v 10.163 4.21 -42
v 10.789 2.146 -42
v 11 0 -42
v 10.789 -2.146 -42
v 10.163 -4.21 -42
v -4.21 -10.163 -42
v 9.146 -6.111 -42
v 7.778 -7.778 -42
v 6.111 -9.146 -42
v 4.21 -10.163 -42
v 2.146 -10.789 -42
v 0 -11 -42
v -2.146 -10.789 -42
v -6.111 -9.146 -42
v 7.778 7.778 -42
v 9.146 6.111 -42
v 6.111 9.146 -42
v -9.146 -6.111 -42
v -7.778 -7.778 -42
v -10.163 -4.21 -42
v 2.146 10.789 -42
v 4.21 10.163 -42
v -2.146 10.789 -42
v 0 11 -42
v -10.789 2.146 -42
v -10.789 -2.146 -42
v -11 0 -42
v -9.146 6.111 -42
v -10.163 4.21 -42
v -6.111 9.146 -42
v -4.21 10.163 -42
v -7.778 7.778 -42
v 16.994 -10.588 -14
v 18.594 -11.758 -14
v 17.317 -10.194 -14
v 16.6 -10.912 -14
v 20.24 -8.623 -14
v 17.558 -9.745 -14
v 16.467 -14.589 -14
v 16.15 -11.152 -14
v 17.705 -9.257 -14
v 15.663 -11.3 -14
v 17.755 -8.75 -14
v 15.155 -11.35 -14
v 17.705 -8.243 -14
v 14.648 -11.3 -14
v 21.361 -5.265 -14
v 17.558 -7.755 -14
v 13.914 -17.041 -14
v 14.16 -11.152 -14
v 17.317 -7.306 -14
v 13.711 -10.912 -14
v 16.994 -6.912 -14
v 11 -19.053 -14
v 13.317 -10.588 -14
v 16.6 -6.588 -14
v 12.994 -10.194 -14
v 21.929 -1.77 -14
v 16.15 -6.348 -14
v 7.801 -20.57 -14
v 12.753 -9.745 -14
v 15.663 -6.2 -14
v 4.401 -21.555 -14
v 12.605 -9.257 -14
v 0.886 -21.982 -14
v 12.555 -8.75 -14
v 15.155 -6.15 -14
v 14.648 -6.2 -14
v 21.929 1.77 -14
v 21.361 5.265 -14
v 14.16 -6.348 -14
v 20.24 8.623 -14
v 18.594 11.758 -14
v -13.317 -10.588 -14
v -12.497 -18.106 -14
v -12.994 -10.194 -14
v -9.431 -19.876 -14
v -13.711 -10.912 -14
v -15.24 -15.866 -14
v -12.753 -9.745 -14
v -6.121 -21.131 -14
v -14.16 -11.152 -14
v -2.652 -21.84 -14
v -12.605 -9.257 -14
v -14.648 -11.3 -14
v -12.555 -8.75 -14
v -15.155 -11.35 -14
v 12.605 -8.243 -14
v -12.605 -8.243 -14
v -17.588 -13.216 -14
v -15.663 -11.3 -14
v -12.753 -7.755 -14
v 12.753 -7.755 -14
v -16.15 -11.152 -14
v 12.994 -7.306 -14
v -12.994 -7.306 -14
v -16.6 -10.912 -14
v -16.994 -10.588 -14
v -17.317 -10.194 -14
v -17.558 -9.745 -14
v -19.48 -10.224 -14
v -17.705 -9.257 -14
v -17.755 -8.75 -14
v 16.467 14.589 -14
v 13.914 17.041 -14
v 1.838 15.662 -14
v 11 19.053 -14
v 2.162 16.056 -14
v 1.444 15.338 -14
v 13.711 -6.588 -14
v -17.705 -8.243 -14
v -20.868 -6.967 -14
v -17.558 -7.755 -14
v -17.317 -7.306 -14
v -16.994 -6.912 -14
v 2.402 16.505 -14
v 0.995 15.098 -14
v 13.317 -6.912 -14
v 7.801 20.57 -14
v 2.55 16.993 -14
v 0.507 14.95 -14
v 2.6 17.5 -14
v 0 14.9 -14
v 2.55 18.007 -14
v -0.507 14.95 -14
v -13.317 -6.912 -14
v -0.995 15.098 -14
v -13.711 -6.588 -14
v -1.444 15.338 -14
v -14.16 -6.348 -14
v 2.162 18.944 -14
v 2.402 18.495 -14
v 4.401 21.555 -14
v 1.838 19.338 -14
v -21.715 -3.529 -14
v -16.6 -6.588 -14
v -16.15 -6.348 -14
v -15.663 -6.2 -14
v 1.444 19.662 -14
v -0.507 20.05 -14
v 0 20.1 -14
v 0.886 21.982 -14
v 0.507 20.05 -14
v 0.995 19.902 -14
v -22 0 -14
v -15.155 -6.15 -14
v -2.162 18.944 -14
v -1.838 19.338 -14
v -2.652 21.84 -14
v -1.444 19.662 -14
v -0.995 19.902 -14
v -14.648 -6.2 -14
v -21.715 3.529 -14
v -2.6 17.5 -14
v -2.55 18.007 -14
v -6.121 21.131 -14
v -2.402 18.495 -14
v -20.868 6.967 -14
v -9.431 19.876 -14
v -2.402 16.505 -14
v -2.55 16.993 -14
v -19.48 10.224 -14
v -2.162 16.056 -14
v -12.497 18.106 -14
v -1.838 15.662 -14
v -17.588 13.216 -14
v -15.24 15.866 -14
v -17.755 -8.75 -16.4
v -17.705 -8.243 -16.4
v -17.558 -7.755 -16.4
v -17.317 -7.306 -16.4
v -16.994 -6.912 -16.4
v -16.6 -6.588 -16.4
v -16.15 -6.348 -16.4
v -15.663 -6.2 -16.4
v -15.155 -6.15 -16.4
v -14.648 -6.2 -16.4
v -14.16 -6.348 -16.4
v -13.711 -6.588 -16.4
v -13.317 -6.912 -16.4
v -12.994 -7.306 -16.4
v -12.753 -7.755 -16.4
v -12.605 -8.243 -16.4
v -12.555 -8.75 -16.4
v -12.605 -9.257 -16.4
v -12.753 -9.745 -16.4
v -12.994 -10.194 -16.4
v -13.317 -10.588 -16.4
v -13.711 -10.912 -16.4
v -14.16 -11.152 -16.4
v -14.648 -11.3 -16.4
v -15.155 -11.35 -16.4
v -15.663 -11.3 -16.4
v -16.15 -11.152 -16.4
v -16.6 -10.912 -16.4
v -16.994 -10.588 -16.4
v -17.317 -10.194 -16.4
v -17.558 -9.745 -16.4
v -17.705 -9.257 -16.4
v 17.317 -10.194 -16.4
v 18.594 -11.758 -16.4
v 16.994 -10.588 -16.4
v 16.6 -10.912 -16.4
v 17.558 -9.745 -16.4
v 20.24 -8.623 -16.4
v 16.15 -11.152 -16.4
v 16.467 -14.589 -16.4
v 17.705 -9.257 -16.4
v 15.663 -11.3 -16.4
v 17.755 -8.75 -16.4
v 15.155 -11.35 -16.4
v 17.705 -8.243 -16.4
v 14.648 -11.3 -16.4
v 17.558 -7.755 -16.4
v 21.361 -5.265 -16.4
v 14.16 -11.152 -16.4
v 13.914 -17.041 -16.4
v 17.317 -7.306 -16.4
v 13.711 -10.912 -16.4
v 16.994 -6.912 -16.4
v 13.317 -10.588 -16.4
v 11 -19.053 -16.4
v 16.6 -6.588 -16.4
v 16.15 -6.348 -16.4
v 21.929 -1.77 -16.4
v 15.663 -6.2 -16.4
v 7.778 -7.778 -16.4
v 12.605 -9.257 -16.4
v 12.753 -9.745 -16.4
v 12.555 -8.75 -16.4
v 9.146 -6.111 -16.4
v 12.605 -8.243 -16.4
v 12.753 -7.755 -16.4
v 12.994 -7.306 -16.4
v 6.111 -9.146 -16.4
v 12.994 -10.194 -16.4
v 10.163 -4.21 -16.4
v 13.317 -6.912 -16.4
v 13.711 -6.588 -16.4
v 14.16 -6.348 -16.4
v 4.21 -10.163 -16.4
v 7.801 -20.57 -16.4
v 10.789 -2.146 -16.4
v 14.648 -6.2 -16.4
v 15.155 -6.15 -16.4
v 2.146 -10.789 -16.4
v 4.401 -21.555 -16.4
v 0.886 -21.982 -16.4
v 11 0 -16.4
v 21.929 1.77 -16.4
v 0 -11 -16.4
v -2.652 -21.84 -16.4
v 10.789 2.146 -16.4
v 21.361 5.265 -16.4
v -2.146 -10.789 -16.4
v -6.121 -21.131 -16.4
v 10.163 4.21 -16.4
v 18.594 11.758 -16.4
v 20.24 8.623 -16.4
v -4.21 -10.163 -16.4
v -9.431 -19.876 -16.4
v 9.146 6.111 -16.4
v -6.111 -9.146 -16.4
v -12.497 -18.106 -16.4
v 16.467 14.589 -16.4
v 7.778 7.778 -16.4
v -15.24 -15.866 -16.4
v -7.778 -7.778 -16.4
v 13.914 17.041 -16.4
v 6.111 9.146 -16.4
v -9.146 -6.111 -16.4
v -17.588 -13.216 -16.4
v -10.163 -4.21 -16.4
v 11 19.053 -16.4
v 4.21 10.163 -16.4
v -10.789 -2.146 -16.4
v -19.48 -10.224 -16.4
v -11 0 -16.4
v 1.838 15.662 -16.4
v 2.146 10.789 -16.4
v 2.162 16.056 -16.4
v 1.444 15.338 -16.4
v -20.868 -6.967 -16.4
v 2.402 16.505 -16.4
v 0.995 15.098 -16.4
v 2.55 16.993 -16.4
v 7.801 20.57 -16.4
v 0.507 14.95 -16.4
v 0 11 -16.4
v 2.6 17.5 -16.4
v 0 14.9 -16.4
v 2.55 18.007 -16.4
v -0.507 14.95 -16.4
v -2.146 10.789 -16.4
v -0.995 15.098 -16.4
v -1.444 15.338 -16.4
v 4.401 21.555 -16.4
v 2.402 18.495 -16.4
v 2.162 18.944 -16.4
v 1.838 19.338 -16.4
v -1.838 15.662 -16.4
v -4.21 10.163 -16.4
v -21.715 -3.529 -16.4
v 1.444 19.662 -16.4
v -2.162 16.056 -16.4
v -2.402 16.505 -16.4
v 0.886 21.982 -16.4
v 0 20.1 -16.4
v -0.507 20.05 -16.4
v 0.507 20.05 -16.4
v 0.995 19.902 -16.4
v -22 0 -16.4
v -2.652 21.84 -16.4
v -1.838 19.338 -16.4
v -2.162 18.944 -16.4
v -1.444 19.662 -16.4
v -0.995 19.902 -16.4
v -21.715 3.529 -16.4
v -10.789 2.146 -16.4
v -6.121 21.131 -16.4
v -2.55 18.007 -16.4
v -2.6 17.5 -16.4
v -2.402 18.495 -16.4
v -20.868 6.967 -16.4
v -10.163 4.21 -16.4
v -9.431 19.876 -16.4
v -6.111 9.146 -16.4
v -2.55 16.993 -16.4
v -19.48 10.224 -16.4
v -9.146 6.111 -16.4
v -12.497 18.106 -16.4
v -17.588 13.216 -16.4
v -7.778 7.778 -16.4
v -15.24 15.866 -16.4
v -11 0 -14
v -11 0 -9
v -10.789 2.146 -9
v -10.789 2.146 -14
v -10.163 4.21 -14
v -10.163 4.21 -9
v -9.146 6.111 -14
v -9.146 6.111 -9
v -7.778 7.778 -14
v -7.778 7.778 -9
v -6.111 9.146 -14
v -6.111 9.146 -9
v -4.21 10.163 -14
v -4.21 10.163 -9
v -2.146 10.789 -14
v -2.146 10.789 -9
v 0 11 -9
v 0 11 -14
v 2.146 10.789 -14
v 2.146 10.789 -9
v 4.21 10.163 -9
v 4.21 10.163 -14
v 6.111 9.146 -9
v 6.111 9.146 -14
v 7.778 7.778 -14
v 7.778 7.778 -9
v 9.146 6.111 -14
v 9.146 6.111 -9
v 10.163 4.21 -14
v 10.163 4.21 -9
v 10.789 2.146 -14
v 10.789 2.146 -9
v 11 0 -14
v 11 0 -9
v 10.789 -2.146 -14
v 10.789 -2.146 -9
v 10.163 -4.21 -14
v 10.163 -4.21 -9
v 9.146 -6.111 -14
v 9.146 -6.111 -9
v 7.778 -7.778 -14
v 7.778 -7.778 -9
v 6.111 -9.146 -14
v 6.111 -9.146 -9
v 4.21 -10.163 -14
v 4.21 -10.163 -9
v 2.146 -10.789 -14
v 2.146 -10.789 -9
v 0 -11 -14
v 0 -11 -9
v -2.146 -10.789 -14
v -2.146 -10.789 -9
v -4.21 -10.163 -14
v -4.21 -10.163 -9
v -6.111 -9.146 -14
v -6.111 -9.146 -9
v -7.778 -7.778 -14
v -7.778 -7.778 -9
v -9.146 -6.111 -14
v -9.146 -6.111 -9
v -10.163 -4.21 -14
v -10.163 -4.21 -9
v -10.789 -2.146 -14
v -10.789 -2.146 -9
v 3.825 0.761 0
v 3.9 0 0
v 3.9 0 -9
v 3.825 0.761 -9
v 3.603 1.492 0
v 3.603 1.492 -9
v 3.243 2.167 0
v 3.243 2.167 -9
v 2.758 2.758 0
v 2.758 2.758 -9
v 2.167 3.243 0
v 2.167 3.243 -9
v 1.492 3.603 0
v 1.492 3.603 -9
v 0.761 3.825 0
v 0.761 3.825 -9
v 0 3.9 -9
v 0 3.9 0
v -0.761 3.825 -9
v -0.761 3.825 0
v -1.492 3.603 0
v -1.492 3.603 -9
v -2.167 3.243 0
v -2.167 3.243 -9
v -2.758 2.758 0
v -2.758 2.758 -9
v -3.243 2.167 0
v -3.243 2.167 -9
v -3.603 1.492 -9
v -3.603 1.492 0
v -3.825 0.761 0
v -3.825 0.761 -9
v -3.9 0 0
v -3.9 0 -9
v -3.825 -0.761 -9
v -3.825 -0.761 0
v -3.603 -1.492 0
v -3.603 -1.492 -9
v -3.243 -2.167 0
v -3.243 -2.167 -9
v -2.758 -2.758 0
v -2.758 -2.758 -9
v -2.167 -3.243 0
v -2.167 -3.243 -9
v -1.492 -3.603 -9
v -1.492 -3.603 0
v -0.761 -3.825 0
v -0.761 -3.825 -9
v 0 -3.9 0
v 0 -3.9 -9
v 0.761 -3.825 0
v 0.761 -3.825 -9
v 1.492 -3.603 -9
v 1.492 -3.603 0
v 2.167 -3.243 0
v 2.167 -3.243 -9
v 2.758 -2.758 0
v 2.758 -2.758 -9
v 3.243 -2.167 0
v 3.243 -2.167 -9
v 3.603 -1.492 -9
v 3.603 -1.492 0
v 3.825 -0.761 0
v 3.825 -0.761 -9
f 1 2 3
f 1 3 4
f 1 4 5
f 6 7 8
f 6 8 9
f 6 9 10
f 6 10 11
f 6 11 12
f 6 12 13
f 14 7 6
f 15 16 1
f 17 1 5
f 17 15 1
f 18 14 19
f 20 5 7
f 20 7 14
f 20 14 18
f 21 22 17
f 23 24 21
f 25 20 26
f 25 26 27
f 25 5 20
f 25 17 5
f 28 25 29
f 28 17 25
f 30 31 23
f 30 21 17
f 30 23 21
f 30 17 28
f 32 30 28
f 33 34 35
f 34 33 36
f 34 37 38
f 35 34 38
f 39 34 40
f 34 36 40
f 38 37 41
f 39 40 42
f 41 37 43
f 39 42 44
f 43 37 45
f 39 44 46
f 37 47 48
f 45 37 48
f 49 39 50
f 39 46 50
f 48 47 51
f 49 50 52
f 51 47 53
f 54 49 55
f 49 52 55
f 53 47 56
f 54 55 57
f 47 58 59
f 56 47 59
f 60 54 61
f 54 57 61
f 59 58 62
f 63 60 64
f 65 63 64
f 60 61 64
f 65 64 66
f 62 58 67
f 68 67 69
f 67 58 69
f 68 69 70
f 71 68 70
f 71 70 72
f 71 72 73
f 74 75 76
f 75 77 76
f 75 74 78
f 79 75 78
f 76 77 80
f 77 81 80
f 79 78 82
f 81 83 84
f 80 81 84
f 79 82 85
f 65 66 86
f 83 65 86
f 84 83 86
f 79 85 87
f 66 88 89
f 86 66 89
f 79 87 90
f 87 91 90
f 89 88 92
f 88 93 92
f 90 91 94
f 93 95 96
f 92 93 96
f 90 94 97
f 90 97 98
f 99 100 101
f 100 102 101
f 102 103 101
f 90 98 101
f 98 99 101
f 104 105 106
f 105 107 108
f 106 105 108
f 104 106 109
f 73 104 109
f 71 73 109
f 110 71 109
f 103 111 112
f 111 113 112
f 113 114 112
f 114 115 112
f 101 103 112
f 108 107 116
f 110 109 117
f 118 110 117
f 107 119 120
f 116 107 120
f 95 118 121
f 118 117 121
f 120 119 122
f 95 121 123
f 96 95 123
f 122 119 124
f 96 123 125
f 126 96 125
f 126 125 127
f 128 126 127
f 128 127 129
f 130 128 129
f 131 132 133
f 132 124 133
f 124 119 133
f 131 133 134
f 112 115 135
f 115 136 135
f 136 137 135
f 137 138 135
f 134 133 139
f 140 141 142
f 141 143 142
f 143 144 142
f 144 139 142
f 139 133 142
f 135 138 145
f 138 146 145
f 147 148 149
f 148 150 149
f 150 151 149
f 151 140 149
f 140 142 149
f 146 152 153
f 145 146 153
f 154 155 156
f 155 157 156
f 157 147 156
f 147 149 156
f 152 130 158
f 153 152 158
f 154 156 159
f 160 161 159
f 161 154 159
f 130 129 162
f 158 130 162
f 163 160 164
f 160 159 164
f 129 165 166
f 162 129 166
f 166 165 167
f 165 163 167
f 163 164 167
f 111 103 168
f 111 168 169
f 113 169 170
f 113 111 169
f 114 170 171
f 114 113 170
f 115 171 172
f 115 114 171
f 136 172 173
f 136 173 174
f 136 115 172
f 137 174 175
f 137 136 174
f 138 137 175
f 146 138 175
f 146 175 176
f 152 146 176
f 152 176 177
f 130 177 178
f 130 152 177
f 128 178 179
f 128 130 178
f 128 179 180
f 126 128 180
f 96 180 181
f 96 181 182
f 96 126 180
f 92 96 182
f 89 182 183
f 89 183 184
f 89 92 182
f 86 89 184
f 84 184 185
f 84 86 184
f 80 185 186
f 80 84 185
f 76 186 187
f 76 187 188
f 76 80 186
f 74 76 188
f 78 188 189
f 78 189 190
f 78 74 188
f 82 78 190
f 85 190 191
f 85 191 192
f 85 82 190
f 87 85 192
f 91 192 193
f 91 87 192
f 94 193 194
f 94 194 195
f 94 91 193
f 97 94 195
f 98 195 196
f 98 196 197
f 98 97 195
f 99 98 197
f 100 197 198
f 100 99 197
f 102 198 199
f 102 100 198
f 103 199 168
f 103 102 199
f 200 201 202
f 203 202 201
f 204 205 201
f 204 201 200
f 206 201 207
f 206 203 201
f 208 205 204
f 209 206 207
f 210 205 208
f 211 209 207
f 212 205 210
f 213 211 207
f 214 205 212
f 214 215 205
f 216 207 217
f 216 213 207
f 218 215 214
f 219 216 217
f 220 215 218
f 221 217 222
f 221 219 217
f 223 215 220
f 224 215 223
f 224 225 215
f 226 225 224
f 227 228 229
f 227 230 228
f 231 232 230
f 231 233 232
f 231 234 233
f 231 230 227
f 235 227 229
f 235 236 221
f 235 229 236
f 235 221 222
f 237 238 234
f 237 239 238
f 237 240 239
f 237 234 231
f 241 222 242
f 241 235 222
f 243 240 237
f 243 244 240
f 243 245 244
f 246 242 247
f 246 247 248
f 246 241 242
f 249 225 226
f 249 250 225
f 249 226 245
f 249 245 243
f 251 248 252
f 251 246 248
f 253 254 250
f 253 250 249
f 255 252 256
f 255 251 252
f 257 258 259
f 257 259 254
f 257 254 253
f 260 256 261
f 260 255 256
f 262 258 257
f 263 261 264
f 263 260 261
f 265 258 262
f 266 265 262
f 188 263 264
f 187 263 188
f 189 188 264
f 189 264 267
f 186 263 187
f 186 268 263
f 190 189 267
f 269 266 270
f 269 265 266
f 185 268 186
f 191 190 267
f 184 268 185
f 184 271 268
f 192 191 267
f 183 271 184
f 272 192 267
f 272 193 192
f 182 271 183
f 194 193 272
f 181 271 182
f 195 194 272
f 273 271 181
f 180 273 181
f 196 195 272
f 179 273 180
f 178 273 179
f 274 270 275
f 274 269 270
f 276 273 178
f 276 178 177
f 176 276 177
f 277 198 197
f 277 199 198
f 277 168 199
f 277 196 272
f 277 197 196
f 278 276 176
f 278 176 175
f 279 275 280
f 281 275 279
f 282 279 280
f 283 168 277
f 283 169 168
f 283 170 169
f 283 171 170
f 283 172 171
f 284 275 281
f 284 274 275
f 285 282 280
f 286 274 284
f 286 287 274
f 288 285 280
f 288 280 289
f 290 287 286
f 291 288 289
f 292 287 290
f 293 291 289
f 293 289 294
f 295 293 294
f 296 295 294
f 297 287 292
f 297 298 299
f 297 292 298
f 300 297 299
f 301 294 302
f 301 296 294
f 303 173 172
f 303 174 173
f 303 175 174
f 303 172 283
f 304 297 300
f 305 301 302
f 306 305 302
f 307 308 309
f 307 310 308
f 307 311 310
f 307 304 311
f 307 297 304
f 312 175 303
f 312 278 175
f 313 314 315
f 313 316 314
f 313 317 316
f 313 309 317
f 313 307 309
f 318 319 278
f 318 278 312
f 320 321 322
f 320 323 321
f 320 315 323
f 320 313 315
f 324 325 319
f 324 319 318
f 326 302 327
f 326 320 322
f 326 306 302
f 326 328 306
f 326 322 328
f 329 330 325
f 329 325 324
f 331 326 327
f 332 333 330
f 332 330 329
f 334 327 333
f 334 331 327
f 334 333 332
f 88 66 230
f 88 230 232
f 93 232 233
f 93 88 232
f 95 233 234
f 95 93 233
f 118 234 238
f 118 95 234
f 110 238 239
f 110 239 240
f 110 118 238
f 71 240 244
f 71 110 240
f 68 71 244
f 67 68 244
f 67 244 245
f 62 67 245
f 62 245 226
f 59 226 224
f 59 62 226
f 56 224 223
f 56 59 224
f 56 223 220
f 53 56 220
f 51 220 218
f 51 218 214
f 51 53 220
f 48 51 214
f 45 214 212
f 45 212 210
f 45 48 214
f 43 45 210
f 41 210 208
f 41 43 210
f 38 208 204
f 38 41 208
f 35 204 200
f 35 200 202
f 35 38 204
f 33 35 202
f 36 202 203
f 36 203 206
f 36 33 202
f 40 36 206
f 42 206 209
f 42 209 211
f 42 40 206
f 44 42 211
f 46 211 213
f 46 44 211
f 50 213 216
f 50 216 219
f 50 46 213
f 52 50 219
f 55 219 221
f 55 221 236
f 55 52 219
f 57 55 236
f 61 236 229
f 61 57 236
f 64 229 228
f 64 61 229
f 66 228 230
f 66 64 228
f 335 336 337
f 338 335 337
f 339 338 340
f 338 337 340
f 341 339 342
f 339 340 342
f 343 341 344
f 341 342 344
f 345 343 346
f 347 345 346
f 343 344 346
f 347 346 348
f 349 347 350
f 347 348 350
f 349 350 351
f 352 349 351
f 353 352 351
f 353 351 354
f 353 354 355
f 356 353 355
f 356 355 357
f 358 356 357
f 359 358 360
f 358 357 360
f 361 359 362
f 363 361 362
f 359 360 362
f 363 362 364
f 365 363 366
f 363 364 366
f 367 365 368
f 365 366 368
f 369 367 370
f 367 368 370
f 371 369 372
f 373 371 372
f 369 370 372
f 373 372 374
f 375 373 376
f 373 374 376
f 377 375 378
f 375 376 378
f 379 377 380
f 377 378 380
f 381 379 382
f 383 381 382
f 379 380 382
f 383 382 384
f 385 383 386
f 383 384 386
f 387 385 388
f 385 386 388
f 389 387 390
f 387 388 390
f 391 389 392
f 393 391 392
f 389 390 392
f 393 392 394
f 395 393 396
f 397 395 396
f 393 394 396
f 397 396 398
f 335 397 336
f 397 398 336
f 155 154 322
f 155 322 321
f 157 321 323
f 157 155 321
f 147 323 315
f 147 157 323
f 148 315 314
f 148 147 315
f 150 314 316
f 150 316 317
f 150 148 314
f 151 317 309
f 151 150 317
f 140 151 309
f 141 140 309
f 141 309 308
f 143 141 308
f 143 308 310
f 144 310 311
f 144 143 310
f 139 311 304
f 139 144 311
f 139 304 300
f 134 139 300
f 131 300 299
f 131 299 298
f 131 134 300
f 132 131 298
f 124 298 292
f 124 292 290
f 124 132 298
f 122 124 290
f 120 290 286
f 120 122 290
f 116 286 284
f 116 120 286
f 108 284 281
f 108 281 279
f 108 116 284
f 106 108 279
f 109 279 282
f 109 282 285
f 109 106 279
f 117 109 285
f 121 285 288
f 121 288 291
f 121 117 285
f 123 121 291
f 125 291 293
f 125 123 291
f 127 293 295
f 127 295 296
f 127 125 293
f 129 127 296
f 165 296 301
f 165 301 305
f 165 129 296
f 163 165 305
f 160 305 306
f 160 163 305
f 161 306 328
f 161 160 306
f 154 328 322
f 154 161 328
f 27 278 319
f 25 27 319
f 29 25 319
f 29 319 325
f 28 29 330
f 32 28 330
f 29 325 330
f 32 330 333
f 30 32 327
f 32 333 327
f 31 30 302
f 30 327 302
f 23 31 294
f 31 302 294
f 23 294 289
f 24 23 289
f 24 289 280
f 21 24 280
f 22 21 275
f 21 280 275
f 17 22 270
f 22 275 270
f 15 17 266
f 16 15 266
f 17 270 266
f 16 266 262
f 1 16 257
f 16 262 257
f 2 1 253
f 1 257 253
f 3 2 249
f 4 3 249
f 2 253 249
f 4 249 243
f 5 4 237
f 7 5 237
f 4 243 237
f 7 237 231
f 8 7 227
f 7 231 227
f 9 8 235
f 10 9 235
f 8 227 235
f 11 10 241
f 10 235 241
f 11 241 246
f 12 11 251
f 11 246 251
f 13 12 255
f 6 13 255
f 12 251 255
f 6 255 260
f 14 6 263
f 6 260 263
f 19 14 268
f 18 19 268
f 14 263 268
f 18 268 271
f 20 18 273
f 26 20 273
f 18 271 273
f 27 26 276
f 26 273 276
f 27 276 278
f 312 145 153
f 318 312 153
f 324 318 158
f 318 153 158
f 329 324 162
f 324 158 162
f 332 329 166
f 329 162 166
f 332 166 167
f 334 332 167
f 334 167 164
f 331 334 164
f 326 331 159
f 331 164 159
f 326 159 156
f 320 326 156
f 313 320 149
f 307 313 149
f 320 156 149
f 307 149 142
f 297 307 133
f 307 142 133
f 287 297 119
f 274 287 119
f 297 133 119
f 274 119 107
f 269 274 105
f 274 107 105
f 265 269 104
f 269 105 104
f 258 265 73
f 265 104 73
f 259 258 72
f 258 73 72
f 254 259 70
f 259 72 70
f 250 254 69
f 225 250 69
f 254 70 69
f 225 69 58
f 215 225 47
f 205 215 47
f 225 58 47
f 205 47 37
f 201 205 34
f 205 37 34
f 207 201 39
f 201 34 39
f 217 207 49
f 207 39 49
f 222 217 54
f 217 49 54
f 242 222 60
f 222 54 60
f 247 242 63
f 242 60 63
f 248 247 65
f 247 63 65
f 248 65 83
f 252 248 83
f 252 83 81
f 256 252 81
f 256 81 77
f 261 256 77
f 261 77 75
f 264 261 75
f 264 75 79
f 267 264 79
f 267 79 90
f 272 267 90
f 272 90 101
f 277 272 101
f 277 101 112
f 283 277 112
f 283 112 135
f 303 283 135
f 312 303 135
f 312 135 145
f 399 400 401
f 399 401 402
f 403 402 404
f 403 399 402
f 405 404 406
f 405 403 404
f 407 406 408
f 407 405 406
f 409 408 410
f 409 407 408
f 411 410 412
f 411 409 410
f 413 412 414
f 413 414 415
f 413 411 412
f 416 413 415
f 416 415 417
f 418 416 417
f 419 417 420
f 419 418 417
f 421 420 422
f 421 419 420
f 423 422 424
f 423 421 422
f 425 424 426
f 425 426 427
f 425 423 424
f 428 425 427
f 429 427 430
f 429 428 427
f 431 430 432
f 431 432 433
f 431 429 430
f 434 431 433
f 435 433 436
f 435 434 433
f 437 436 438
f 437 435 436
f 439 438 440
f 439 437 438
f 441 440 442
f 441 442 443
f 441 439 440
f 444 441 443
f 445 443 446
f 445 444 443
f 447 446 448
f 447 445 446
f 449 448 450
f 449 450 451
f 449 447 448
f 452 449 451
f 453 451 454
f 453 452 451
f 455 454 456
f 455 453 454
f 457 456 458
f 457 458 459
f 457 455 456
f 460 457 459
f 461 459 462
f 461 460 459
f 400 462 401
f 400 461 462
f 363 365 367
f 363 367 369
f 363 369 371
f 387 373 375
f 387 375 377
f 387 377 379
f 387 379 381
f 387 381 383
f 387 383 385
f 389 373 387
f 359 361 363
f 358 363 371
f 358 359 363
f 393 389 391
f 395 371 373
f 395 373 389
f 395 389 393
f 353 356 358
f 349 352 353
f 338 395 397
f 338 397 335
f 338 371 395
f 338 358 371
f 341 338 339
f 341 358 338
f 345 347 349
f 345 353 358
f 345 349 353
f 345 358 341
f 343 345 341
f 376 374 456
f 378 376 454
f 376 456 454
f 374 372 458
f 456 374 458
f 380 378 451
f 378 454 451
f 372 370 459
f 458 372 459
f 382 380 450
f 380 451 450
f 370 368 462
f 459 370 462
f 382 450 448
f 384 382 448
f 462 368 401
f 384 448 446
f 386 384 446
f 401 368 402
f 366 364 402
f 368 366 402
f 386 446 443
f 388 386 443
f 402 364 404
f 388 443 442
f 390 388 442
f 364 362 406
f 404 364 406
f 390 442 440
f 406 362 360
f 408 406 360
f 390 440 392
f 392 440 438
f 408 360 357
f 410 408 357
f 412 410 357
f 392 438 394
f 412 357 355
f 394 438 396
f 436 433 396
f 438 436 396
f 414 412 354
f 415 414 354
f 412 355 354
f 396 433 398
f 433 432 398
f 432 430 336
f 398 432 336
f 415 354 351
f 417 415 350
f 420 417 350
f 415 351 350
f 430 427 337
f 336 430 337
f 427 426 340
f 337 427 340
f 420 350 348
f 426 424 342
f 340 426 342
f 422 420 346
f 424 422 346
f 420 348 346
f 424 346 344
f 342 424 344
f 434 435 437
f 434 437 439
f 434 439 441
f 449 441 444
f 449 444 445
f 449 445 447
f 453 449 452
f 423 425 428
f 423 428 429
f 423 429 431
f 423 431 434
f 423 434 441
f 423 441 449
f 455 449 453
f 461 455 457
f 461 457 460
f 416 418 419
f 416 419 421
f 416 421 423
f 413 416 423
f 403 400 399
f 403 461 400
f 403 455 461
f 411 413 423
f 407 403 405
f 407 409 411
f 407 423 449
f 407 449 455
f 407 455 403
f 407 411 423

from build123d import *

# Parameters (mm, degrees)
SKETCH1_R           = 3.9
BOSS_EXTRUDE1_DEPTH = 9
SKETCH2_R           = 11
BOSS_EXTRUDE2_DEPTH = 5
SKETCH3_R           = 22
SKETCH3_R_2         = 2.6
SKETCH3_R_3         = 11
BOSS_EXTRUDE3_DEPTH = 2.4
SKETCH4_R           = 11
BOSS_EXTRUDE4_DEPTH = 25.6


with BuildPart() as part:
    # Sketch1 → Boss-Extrude1 (new body)
    with BuildSketch(Plane.XY):
        Circle(SKETCH1_R)
    extrude(amount=-BOSS_EXTRUDE1_DEPTH)

    # Sketch2 → Boss-Extrude2 (add)
    with BuildSketch(Plane(origin=(0, 0, -9), x_dir=(-1, 0, 0), z_dir=(0, 0, -1))):
        Circle(SKETCH2_R)
    extrude(amount=BOSS_EXTRUDE2_DEPTH)


with BuildPart() as body_2:
    # Sketch3 → Boss-Extrude3 (new body)
    # profile 1 of 2: a face of its own
    with BuildSketch(Plane(origin=(0, 0, -14), x_dir=(-1, 0, 0), z_dir=(0, 0, -1))):
        Circle(SKETCH3_R)
        with Locations((-15.155444566, -8.75)):
            Circle(SKETCH3_R_2, mode=Mode.SUBTRACT)
        with Locations((15.155444566, -8.75)):
            Circle(SKETCH3_R_2, mode=Mode.SUBTRACT)
        with Locations((0, 17.5)):
            Circle(SKETCH3_R_2, mode=Mode.SUBTRACT)
        Circle(SKETCH3_R_3, mode=Mode.SUBTRACT)
    # profile 2 of 2: a face of its own
    with BuildSketch(Plane(origin=(0, 0, -14), x_dir=(-1, 0, 0), z_dir=(0, 0, -1))):
        Circle(SKETCH3_R_3)
    extrude(amount=BOSS_EXTRUDE3_DEPTH)

    # Sketch4 → Boss-Extrude4 (add)
    with BuildSketch(Plane(origin=(0, 0, -16.4), x_dir=(-1, 0, 0), z_dir=(0, 0, -1))):
        Circle(SKETCH4_R)
    extrude(amount=BOSS_EXTRUDE4_DEPTH)


solid = Compound([part.part, body_2.part])
